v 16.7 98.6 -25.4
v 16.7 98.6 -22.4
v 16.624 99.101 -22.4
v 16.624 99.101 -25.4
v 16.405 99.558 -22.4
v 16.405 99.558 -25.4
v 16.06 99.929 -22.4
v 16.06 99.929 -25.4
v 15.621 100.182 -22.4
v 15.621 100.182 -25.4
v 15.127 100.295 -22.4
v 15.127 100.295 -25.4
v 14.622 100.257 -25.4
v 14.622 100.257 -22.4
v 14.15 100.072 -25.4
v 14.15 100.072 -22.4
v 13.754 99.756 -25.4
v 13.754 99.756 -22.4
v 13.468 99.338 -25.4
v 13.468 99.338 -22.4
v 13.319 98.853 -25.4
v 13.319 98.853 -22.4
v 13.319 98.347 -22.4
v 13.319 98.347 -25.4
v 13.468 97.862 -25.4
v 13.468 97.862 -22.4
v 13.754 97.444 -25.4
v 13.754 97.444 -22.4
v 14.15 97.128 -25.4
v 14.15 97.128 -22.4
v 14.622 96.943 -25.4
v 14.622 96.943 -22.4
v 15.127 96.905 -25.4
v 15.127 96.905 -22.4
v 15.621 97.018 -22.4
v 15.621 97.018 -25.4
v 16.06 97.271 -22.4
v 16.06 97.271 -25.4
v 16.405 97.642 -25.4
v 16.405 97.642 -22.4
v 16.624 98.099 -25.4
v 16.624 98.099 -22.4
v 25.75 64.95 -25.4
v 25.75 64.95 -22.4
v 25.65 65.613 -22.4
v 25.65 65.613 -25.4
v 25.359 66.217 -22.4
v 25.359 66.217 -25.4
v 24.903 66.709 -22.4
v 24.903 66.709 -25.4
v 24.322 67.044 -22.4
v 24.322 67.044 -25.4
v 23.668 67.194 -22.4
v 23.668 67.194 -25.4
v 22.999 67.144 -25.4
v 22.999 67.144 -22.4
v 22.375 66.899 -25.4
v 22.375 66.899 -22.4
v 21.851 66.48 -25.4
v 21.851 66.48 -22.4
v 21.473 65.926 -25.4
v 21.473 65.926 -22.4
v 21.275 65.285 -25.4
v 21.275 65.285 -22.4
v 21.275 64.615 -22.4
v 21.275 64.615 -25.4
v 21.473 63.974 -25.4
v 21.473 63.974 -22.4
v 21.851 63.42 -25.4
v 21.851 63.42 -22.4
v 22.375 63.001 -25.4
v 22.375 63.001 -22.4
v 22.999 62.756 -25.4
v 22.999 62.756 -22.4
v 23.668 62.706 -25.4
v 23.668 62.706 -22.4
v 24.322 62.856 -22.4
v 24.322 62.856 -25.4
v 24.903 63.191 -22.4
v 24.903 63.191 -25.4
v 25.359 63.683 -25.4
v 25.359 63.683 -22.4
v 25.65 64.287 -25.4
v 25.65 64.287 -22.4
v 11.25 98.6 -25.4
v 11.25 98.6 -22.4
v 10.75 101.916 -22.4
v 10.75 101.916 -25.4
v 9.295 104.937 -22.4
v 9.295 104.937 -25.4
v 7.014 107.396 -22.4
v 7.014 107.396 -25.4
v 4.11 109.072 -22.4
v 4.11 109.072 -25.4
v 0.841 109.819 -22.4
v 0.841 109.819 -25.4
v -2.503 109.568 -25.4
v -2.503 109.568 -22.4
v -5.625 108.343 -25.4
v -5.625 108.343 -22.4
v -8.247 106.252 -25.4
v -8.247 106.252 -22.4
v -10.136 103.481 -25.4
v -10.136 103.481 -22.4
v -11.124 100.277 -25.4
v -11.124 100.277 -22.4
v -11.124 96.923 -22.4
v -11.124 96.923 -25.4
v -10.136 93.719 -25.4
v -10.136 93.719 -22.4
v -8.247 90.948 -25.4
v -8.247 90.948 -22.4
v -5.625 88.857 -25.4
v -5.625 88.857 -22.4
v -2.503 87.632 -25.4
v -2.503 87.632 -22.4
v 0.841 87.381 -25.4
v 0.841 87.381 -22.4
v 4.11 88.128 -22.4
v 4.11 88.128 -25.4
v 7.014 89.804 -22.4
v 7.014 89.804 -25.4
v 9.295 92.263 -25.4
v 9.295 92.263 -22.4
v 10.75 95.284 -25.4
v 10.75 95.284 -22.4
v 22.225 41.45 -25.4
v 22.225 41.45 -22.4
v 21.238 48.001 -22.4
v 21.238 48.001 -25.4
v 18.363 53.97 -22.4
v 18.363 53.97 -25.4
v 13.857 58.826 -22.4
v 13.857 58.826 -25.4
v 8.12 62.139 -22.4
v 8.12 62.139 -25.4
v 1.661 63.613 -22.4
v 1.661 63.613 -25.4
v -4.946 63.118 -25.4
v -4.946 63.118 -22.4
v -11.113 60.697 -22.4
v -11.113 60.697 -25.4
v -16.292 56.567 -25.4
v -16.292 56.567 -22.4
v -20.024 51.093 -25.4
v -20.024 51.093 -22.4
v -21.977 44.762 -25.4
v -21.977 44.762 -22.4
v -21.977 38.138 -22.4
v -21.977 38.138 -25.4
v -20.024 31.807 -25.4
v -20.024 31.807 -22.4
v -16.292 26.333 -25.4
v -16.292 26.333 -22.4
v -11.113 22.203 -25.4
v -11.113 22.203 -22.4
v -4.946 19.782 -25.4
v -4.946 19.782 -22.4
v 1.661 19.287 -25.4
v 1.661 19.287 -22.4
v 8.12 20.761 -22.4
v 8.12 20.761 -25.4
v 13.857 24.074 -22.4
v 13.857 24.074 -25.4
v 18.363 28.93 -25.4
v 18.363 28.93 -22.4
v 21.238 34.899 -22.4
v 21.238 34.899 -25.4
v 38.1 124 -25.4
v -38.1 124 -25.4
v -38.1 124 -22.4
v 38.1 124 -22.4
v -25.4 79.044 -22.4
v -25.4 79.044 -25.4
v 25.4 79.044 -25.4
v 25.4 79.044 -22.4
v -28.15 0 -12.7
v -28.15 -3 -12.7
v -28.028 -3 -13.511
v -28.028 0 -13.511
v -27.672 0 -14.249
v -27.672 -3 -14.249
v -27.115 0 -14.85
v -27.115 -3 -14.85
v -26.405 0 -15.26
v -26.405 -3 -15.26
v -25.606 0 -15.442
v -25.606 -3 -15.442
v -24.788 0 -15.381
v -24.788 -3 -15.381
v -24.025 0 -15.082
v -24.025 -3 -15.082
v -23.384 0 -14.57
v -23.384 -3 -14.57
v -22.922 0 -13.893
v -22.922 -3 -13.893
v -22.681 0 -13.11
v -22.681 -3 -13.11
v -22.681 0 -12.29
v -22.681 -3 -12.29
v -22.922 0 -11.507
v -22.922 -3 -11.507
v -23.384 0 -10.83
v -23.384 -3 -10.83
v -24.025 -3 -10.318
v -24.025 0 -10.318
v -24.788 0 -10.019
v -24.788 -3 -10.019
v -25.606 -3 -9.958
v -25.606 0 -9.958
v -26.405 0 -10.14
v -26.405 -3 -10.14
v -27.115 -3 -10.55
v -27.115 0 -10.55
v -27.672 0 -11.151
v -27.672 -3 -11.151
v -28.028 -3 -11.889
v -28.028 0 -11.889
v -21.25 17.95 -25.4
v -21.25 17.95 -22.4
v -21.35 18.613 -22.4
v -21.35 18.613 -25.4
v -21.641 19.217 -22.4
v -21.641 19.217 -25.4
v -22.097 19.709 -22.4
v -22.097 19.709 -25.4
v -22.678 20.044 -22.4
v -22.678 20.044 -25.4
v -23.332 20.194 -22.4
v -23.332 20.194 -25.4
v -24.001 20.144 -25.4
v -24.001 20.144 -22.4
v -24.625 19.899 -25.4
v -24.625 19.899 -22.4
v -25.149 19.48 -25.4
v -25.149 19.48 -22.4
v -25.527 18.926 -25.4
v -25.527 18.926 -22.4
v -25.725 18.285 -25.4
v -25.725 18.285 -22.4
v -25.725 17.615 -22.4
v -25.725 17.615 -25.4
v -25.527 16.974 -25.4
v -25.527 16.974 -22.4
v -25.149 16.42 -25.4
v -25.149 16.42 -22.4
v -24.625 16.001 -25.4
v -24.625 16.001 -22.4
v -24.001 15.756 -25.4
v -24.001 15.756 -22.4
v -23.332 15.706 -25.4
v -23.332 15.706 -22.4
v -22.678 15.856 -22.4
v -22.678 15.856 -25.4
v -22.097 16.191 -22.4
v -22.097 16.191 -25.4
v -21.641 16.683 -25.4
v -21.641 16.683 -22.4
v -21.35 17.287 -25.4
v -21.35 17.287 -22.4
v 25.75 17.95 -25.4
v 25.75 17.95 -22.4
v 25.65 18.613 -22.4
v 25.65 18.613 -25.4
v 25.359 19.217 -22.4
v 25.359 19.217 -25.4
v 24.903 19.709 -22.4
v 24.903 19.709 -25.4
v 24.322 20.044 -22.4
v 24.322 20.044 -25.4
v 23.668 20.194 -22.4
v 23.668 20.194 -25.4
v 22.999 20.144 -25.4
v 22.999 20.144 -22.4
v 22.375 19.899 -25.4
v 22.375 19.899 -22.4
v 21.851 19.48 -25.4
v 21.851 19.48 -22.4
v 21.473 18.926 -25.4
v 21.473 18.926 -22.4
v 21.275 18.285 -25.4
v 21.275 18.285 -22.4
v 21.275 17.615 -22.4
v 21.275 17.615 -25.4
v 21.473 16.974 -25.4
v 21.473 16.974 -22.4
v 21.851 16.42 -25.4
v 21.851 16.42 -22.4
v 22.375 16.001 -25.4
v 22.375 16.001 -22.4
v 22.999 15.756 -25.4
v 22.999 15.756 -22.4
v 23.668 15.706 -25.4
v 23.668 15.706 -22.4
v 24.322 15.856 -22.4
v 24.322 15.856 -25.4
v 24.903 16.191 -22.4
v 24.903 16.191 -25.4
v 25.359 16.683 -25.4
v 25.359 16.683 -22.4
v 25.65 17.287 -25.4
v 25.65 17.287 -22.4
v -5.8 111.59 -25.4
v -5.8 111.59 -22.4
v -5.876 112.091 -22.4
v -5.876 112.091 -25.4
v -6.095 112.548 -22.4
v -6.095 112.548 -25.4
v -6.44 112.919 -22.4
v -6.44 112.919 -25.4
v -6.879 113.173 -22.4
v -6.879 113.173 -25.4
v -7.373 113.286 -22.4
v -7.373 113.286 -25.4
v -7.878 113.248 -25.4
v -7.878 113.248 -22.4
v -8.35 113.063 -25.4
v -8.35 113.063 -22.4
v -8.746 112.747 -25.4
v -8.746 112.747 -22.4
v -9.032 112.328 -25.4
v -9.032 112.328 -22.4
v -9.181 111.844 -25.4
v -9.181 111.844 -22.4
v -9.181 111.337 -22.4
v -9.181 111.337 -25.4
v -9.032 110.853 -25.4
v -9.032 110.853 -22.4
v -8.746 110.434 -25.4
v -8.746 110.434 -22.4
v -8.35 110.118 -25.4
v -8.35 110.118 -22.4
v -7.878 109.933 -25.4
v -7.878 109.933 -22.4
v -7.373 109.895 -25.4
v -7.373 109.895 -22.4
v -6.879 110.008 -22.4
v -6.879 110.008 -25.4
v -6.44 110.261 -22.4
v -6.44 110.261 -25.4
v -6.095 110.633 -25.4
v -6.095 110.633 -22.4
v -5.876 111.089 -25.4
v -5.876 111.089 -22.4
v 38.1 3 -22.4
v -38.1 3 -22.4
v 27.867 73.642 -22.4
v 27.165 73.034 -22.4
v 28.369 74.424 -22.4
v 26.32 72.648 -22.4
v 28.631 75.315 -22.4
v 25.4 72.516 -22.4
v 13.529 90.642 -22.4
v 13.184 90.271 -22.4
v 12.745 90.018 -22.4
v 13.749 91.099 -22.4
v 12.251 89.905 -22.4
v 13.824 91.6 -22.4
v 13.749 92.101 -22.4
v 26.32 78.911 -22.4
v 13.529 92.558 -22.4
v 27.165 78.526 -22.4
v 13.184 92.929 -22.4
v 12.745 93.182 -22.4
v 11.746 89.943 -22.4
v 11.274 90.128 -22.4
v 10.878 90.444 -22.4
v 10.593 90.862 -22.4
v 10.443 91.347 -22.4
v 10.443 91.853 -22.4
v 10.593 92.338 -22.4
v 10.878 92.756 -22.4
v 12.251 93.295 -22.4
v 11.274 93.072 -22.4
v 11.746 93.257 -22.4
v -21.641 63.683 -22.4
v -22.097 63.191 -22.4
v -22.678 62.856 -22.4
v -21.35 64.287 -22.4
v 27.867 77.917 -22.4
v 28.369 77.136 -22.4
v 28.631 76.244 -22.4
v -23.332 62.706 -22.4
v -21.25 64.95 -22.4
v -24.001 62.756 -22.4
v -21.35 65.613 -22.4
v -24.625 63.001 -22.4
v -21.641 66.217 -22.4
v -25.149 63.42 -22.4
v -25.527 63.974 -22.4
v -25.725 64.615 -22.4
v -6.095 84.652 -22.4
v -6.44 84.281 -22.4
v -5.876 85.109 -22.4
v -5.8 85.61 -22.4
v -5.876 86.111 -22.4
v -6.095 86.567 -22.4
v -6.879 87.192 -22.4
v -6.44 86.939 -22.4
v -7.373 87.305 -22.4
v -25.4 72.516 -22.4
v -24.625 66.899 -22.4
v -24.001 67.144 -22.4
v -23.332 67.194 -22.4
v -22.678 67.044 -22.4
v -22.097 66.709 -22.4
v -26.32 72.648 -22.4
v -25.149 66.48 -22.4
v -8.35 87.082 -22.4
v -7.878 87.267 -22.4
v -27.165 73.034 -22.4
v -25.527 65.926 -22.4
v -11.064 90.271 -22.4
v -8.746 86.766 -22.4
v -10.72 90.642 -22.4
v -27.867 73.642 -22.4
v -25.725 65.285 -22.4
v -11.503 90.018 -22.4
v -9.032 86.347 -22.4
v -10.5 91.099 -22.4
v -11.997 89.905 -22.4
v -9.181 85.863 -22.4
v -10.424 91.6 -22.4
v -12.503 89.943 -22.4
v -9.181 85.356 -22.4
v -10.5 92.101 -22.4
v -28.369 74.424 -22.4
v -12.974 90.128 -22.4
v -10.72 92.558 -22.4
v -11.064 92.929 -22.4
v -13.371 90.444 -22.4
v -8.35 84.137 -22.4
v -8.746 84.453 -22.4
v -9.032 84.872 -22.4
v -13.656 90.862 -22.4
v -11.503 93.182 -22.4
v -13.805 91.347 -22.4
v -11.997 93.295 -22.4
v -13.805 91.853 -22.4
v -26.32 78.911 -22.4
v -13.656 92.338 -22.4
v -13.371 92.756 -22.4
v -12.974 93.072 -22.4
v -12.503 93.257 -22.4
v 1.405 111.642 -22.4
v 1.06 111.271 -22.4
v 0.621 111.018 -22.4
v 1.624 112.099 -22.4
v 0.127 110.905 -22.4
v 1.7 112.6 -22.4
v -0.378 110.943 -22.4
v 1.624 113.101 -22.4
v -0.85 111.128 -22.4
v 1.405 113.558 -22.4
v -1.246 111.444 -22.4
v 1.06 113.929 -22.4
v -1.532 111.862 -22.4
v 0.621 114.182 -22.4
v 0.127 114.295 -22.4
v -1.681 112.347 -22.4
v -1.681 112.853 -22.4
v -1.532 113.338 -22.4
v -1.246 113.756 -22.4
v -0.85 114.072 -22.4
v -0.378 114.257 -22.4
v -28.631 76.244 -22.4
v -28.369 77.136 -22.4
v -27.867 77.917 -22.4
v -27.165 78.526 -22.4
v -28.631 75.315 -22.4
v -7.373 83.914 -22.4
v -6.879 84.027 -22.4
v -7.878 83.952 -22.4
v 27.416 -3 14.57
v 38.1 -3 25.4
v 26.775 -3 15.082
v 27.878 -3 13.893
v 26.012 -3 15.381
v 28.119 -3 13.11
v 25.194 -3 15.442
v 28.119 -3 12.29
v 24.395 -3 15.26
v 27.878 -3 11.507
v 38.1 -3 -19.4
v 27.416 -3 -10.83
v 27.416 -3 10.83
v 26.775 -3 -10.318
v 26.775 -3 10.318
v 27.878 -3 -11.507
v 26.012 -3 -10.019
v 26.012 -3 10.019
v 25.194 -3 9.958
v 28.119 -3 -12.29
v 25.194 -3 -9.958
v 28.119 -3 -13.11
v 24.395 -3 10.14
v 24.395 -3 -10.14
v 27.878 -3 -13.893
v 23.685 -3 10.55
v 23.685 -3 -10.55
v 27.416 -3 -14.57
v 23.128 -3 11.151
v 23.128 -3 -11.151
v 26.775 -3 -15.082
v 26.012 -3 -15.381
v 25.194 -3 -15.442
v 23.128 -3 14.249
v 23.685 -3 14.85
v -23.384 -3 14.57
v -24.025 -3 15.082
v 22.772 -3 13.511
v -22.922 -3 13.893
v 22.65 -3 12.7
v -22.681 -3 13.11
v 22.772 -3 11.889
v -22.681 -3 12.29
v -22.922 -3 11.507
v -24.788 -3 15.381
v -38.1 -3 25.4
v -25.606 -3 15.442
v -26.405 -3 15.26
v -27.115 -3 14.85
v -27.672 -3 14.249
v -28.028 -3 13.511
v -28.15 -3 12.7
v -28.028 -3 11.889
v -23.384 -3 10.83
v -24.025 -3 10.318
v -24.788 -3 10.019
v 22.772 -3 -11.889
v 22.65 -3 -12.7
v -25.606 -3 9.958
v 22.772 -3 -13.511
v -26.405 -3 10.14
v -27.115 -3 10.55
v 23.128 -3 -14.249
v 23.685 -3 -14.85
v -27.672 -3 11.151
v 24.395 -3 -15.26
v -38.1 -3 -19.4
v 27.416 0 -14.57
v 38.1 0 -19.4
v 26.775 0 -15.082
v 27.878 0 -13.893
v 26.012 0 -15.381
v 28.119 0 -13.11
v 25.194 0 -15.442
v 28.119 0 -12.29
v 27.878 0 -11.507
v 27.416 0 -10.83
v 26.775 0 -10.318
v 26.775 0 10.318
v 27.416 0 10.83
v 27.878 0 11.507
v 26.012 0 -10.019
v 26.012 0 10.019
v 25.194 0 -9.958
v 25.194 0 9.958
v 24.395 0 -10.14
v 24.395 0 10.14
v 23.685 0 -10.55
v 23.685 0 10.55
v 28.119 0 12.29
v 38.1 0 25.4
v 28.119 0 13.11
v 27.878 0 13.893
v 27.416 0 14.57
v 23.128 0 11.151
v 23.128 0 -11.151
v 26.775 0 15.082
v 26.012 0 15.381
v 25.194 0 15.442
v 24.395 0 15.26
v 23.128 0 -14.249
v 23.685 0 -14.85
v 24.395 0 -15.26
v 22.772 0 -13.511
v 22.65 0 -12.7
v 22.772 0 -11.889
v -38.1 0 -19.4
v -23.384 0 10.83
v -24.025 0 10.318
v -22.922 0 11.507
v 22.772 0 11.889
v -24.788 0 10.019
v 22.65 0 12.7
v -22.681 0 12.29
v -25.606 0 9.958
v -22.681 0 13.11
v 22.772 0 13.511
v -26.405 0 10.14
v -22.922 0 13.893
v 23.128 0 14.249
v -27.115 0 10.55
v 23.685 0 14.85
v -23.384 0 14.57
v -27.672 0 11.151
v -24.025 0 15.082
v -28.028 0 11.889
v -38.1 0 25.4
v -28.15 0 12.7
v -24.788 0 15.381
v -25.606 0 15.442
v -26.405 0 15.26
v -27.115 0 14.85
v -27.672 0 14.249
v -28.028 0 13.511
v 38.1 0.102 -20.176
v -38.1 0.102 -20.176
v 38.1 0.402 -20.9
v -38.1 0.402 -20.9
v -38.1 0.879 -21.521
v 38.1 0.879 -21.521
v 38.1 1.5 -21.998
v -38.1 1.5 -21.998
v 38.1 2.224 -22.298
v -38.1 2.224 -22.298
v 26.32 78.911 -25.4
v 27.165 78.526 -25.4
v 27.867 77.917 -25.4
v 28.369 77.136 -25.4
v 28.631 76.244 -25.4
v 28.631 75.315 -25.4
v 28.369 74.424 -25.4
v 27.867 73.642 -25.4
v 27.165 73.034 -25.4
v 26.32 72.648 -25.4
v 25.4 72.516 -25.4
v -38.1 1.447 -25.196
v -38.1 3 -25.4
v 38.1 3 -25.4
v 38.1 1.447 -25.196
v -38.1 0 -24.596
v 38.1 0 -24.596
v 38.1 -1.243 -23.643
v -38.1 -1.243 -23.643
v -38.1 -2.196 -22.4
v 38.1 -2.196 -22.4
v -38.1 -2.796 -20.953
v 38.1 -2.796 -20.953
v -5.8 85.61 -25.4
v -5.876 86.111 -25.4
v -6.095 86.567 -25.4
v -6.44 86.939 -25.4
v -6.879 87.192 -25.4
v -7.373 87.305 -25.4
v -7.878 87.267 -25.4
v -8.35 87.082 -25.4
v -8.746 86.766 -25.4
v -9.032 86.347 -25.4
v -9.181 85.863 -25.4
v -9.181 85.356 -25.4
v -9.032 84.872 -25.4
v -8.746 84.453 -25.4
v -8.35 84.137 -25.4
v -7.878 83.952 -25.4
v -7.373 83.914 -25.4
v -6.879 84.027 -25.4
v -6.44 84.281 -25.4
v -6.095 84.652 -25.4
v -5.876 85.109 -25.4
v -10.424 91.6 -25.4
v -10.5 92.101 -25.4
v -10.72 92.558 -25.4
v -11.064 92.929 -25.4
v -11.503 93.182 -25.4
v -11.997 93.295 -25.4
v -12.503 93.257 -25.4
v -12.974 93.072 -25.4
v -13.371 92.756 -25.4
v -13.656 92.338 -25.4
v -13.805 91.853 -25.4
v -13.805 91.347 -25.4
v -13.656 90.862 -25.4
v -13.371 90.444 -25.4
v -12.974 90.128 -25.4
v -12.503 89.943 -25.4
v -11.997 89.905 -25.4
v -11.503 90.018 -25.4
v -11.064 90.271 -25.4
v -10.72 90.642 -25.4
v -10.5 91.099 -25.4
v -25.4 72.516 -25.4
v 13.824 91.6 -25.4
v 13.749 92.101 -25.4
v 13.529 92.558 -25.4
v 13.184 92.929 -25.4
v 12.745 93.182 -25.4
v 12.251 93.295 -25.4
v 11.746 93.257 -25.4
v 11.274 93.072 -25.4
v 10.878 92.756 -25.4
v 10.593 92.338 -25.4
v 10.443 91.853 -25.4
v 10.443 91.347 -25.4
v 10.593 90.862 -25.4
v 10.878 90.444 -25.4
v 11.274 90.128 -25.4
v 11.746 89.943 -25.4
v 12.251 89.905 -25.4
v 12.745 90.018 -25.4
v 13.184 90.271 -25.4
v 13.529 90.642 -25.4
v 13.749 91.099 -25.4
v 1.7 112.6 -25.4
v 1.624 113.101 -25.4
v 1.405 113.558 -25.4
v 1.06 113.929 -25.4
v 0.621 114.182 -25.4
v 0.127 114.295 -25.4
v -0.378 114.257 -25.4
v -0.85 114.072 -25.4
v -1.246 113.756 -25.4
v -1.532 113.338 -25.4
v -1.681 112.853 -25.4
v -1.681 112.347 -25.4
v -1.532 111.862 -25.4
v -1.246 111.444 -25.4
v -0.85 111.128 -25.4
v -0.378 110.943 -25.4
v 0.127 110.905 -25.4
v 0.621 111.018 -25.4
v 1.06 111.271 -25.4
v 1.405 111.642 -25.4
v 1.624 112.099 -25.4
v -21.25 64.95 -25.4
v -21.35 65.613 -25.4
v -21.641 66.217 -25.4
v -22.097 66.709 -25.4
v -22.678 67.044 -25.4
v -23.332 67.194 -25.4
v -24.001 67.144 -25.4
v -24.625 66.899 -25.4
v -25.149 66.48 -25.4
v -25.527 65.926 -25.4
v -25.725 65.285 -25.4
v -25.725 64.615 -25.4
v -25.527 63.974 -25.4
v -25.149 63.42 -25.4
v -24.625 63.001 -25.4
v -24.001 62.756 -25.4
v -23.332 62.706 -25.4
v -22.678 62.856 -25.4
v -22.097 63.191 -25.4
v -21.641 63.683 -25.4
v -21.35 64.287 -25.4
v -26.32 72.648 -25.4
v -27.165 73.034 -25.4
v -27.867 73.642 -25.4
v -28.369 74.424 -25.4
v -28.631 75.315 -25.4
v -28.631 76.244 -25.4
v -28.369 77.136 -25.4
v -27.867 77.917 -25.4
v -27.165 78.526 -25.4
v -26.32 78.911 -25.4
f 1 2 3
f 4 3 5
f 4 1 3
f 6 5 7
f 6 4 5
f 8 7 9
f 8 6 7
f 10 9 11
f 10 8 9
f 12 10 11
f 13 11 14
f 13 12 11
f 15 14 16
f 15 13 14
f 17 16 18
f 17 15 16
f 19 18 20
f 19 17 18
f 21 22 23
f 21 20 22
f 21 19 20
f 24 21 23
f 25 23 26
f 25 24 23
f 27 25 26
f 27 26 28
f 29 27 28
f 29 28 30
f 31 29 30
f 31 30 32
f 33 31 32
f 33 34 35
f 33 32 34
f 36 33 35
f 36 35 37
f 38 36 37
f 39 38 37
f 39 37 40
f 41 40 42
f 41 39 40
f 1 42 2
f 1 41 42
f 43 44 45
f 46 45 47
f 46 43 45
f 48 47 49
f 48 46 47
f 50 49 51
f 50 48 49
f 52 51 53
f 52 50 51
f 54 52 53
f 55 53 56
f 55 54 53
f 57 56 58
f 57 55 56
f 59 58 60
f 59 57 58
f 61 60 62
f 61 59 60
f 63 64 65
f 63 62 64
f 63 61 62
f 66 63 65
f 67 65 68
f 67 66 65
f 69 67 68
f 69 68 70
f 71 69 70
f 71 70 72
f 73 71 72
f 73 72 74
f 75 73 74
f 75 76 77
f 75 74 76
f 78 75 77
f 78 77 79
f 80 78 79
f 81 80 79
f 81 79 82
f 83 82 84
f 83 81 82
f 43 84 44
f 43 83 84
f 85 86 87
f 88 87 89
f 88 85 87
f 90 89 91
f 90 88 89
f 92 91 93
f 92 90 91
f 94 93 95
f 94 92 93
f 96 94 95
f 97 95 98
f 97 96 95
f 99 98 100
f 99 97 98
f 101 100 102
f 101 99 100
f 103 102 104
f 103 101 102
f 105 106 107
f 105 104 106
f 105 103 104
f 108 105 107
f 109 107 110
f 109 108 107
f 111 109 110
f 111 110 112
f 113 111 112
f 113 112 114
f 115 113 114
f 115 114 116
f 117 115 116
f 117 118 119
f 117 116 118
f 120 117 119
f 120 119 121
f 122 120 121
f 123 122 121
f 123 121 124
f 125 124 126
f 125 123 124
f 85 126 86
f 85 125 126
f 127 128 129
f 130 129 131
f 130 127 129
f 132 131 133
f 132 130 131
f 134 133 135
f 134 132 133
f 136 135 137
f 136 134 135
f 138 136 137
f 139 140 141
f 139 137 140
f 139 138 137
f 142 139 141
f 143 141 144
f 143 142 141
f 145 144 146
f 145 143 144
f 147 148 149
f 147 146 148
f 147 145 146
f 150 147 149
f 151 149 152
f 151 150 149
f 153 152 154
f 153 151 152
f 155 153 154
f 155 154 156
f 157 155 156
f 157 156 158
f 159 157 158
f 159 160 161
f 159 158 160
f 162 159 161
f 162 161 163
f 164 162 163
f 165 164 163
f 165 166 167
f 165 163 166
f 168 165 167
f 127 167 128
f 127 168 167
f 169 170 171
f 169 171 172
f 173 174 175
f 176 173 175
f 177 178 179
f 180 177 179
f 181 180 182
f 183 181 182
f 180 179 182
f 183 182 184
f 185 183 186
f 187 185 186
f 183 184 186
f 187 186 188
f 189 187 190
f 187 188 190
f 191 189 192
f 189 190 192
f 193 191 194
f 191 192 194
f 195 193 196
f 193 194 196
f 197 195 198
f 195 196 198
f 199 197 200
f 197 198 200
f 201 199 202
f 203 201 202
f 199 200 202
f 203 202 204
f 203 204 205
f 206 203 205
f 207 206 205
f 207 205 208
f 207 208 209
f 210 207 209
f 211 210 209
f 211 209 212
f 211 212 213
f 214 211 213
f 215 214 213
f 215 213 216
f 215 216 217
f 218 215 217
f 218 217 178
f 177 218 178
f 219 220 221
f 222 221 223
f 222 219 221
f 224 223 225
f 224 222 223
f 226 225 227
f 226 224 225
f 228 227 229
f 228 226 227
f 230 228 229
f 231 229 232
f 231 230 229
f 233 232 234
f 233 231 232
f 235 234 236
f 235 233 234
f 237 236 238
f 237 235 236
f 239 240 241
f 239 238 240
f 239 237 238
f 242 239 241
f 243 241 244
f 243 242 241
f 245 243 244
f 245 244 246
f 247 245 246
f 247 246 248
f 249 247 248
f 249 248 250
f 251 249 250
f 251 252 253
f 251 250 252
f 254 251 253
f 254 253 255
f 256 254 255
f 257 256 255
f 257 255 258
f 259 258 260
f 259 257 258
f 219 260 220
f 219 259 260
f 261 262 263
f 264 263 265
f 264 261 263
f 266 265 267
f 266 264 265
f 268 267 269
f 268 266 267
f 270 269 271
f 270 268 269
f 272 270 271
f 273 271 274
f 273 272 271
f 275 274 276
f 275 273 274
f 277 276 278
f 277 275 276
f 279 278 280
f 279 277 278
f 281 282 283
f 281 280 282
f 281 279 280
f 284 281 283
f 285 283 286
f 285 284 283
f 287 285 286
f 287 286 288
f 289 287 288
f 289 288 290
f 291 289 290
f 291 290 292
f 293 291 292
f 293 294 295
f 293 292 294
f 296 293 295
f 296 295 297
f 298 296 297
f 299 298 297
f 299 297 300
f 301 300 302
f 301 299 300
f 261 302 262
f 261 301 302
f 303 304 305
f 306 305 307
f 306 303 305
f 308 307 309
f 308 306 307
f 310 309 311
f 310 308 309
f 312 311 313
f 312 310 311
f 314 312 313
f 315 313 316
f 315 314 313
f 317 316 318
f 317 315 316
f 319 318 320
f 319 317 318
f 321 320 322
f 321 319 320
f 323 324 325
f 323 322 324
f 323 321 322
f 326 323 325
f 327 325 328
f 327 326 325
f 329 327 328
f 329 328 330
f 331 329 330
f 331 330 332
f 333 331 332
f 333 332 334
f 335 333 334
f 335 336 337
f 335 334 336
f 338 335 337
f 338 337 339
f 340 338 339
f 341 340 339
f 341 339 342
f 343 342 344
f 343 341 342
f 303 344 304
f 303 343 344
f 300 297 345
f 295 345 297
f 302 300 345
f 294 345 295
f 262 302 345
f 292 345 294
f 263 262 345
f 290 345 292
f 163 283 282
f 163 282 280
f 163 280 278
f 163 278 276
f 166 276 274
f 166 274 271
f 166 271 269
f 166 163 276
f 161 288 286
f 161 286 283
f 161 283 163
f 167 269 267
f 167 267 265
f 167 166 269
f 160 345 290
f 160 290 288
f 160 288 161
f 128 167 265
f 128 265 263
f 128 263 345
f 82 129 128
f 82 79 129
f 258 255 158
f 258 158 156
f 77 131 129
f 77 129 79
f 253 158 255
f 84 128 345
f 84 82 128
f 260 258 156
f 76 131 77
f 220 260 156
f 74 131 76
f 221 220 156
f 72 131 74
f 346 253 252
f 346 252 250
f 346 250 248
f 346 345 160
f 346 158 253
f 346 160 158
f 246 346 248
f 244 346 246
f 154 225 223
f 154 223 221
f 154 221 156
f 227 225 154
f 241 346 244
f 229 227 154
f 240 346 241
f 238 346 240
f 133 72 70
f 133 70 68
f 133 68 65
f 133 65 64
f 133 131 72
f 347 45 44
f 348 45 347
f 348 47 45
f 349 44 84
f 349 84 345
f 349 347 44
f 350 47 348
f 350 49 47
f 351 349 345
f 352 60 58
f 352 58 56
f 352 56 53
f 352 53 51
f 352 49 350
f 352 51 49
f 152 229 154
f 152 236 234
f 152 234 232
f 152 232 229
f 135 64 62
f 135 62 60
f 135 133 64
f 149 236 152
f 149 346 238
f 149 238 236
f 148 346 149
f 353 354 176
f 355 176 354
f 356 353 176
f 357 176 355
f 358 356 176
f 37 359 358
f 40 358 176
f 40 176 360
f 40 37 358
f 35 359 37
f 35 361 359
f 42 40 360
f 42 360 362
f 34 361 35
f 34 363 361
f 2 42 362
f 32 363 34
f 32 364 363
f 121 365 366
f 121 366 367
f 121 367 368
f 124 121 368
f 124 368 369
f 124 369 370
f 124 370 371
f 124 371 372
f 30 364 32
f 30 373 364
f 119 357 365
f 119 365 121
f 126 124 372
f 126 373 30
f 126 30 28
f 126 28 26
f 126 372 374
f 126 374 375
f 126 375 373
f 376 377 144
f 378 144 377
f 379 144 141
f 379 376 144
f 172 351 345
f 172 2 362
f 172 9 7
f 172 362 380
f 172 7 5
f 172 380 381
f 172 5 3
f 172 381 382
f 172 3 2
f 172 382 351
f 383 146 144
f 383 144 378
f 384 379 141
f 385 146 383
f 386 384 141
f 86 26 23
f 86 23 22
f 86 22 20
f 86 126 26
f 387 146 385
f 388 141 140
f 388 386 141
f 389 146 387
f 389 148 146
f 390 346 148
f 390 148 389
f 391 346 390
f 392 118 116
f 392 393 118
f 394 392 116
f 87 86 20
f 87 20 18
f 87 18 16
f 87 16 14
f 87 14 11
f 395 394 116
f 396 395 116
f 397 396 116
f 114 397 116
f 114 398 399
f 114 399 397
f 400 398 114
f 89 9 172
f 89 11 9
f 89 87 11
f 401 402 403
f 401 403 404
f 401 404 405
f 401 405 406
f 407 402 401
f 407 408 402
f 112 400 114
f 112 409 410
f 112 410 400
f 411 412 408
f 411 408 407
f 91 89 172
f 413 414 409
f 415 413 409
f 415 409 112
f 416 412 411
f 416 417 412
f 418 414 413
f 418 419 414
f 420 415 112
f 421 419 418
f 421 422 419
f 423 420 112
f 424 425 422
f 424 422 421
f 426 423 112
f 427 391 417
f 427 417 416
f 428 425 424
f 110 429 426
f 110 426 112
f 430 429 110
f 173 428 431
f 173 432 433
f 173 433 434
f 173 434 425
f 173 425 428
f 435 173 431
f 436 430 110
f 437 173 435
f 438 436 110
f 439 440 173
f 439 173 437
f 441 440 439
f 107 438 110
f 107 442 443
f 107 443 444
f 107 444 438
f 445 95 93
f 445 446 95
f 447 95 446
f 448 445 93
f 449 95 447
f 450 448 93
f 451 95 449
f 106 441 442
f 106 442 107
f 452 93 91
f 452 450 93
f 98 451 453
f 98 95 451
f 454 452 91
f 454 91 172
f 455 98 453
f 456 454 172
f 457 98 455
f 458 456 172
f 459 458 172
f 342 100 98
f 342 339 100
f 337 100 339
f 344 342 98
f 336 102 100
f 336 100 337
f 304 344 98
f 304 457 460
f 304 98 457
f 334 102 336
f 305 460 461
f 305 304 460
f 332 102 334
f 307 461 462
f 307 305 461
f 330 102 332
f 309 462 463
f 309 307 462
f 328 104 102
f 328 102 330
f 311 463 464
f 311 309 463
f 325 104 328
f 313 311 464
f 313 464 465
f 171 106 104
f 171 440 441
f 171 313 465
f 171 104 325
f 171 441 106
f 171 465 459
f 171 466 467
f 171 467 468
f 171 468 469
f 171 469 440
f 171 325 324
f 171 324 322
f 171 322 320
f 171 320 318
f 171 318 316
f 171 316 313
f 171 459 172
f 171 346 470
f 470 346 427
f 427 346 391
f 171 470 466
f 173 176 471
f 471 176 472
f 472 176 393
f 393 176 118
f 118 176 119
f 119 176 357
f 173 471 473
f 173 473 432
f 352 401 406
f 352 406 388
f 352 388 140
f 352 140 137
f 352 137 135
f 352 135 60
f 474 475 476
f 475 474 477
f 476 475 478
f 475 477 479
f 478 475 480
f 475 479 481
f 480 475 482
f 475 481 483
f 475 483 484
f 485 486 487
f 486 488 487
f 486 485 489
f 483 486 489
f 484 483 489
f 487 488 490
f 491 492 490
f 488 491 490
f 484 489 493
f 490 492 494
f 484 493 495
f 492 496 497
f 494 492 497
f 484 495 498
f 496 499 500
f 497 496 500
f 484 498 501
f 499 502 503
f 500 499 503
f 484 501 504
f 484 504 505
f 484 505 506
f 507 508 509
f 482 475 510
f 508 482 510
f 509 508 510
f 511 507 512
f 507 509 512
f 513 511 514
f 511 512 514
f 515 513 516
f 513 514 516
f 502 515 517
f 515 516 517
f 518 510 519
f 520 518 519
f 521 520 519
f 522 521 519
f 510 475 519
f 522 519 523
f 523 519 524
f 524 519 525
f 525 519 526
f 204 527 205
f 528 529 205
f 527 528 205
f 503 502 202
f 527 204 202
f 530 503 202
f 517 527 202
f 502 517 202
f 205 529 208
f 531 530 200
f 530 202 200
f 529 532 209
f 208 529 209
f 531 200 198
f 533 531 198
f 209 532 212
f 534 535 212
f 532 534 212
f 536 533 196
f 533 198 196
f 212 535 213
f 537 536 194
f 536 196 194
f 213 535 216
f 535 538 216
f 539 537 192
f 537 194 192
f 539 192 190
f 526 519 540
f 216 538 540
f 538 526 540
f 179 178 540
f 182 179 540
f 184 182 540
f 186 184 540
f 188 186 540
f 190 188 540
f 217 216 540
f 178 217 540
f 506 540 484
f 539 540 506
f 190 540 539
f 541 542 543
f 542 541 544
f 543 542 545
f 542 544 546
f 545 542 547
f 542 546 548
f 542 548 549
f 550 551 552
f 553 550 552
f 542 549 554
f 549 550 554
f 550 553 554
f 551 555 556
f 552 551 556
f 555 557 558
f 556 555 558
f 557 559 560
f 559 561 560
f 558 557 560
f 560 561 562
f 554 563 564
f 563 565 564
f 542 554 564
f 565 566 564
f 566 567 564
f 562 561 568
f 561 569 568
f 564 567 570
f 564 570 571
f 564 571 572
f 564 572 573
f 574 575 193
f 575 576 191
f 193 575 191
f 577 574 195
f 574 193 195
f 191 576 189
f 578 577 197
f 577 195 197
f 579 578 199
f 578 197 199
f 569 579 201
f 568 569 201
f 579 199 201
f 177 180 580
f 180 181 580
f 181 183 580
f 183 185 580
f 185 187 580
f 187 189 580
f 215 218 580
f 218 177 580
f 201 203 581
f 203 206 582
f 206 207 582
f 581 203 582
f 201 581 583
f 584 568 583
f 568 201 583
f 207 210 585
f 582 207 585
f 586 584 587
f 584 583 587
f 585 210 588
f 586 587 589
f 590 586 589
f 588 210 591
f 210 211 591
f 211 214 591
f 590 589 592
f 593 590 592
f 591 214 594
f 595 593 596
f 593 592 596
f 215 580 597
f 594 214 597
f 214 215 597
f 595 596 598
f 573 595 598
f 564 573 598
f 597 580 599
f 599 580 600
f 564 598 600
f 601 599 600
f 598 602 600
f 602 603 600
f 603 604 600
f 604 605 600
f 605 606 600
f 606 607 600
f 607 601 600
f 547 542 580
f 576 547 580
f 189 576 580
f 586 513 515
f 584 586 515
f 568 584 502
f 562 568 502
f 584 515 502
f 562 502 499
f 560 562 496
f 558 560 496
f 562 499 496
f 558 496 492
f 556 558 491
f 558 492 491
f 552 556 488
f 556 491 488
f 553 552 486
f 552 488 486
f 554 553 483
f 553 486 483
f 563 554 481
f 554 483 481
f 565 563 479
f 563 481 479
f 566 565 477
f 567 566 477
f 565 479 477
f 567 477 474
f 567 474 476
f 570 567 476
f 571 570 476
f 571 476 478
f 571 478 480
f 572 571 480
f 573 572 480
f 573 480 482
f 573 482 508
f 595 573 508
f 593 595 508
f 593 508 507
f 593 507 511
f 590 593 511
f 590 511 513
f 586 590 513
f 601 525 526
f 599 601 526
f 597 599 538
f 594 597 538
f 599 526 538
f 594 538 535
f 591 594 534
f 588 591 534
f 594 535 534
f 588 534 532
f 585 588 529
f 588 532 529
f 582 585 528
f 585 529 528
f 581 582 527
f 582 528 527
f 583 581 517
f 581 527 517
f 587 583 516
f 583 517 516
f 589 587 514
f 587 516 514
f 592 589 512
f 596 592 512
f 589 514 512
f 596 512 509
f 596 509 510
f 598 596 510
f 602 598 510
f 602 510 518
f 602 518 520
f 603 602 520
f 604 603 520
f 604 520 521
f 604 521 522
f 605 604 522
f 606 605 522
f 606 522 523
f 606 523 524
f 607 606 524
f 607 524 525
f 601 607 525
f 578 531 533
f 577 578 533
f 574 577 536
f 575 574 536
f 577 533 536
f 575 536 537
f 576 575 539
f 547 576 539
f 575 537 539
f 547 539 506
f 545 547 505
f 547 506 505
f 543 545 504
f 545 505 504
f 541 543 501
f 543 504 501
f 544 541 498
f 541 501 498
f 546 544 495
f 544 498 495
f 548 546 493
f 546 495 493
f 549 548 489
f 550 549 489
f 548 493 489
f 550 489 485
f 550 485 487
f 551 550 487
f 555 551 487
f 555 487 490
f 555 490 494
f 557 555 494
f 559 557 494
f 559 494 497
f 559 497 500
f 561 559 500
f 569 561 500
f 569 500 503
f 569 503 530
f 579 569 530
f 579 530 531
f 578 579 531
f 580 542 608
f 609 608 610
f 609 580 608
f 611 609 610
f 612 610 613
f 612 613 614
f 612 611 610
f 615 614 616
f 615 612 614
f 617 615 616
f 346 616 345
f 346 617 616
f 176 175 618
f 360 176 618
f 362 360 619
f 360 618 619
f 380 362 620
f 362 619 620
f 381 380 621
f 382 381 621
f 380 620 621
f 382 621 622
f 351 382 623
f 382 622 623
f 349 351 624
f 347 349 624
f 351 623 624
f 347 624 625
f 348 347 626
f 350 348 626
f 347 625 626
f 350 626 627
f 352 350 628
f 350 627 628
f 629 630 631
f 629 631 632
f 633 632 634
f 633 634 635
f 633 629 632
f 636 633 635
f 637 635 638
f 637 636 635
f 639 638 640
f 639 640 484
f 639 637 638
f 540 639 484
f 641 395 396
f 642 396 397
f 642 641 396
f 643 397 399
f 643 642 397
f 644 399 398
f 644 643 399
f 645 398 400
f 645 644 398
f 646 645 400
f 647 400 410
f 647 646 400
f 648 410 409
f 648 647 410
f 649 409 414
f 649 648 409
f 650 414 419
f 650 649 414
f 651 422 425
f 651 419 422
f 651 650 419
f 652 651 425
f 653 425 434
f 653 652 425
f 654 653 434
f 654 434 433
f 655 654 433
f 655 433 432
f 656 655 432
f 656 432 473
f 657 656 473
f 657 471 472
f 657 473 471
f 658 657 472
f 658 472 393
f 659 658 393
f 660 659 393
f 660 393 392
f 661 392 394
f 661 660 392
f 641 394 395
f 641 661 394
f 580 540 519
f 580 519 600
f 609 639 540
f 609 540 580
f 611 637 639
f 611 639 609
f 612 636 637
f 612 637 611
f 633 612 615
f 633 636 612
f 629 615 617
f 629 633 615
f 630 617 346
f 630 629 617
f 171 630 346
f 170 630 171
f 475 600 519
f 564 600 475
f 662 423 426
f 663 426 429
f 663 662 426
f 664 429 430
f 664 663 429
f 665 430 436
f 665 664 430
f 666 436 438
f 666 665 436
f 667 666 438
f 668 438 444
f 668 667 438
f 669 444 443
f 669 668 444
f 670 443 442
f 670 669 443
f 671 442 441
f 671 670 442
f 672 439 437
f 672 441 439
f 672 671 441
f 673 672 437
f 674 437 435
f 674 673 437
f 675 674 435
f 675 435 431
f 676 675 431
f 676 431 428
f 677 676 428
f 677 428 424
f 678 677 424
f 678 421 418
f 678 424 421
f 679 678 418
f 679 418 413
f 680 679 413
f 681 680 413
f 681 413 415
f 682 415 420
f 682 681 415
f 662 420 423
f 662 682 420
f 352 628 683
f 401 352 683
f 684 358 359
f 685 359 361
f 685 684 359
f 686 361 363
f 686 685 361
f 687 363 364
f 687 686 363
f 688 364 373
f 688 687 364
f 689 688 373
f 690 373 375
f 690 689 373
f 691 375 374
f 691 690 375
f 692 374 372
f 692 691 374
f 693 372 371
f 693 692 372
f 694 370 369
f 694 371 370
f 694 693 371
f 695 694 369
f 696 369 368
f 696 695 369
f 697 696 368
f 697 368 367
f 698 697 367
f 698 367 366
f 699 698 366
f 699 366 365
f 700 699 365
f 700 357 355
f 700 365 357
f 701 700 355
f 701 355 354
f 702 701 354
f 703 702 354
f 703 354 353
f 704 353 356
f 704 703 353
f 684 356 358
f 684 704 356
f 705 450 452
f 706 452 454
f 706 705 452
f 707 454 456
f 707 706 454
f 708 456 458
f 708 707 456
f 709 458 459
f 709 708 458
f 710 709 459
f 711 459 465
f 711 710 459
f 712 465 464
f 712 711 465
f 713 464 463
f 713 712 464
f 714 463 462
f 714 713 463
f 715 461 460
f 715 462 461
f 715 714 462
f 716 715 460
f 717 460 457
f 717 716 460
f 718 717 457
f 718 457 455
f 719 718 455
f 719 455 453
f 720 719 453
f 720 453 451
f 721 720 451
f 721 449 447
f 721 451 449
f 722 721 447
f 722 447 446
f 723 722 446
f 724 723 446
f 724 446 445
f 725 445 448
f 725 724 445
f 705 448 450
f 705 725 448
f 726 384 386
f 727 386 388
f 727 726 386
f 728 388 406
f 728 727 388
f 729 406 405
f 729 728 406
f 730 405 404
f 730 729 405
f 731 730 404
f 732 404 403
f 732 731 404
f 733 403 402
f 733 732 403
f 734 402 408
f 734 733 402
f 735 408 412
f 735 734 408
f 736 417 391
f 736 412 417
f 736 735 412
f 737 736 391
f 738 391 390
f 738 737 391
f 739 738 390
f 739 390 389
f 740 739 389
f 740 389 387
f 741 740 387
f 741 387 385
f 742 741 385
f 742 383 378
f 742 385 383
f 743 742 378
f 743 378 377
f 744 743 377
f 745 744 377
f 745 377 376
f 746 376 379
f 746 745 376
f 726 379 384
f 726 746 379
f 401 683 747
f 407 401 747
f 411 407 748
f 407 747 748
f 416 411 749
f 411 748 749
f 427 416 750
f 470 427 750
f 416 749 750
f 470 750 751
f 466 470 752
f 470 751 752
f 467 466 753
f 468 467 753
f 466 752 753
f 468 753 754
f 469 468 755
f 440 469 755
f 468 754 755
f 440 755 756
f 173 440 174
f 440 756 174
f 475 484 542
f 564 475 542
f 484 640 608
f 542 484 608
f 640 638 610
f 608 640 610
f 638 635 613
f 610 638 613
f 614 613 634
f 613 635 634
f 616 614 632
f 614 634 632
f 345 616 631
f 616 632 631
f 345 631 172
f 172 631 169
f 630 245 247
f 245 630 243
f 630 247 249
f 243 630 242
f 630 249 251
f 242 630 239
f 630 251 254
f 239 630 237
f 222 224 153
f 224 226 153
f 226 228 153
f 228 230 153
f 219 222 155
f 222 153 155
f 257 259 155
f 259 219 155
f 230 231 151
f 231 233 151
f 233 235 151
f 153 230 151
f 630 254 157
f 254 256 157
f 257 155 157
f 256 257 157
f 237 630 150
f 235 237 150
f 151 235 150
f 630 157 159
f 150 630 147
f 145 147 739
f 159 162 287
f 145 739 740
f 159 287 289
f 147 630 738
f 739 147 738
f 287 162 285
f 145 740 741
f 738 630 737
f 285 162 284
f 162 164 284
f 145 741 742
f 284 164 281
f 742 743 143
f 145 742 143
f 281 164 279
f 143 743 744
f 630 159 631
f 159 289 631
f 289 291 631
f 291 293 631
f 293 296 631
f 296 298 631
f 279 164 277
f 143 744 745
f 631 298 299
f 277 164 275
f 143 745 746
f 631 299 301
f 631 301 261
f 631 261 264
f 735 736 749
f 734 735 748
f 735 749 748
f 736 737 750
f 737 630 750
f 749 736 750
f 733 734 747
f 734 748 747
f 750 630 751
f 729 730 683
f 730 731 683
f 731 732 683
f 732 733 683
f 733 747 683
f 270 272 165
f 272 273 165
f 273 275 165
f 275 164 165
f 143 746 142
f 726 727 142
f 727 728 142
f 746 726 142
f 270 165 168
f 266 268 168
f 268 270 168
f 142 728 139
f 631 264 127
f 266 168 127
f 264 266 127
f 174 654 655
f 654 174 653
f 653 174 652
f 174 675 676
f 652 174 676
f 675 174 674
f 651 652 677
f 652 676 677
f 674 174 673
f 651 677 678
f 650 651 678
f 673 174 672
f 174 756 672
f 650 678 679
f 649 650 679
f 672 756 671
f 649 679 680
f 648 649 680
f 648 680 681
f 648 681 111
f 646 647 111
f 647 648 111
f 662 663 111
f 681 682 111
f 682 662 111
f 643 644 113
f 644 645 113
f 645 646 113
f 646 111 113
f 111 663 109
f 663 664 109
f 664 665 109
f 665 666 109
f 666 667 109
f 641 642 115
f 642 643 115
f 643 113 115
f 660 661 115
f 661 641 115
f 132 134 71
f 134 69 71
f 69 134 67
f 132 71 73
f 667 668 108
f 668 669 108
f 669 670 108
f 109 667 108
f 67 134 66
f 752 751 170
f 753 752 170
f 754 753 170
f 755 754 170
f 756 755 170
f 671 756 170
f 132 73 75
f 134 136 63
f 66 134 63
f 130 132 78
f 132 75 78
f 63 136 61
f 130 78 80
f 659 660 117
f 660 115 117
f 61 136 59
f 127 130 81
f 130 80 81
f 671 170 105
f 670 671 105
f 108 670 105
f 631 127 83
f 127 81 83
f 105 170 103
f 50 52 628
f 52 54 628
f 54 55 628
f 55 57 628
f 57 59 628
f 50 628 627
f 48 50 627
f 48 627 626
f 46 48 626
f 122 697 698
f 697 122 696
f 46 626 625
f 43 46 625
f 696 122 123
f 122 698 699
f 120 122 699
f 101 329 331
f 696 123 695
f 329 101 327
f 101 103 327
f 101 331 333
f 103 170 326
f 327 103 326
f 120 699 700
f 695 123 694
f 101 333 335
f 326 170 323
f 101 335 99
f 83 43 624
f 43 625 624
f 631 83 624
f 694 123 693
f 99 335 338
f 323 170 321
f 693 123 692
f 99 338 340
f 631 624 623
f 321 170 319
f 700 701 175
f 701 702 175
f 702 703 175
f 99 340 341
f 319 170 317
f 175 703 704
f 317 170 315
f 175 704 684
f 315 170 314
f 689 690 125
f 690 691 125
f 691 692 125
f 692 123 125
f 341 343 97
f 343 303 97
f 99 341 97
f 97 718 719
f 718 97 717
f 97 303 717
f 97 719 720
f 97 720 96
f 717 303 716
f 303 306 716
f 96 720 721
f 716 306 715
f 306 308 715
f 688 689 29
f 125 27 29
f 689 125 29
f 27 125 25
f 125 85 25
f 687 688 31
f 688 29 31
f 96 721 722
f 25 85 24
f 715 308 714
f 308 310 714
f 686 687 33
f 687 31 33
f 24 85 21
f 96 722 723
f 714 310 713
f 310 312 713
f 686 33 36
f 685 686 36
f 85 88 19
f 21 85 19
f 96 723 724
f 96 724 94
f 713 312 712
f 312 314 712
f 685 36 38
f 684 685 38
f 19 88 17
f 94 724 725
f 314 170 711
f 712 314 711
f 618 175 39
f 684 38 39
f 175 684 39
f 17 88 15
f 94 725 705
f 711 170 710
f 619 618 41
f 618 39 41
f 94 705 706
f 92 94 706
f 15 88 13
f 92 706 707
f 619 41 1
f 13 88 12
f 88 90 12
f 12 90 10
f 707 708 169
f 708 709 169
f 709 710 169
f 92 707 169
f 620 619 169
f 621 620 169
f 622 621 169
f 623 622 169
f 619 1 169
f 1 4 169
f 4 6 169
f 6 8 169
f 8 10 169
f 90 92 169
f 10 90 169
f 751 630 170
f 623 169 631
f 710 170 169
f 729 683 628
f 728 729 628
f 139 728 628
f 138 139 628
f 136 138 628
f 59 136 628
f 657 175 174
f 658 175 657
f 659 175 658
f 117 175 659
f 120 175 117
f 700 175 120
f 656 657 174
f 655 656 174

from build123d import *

# Parameters (mm, degrees)
SKETCH1_W                    = 76.2
SKETCH1_H                    = 50.8
BASE_FLANGE1_DEPTH           = 3
EDGE_FLANGE1_STRIP_W         = 18
EDGE_FLANGE1_STRIP_H         = 3
EDGE_FLANGE1_STRIP_CUT_DEPTH = 76.2
EDGE_FLANGE1_DEPTH           = 76.2
UNFOLD1_START                = -38.1
UNFOLD1_DEPTH                = 76.2
UNFOLD1_2_DEPTH              = 76.2
M5_CLEARANCE_HOLE1_D         = 5.5
M4_CLEARANCE_HOLE1_D         = 4.5
SKETCH15_R                   = 22.225
CUT_EXTRUDE1_DEPTH           = 153.340385686
M3_CLEARANCE_HOLE1_D         = 3.4
CIRPATTERN1_COUNT            = 3
SKETCH19_R                   = 11.25
CUT_EXTRUDE2_DEPTH           = 153.340385686
FOLD1_START                  = -147.468583471
FOLD1_OUTLINE_W              = 76.2
FOLD1_OUTLINE_H              = 3
FOLD1_DEPTH                  = 122.685023471
FOLD1_START_2                = -22.41644
FOLD1_2_OUTLINE_W            = 76.2
FOLD1_2_OUTLINE_H            = 124
FOLD1_2_OUTLINE_R            = 2.25
FOLD1_2_OUTLINE_R_2          = 22.225
FOLD1_2_OUTLINE_R_3          = 1.7
FOLD1_2_OUTLINE_R_4          = 11.25
FOLD1_2_DEPTH                = 0.01644
FOLD1_START_3                = -25.4
FOLD1_3_OUTLINE_W            = 76.2
FOLD1_3_OUTLINE_H            = 124
FOLD1_3_OUTLINE_R            = 2.25
FOLD1_3_OUTLINE_R_2          = 22.225
FOLD1_3_OUTLINE_R_3          = 1.7
FOLD1_3_OUTLINE_R_4          = 11.25
FOLD1_3_DEPTH                = 6
FOLD1_START_4                = -38.1
FOLD1_4_DEPTH                = 76.2


with BuildPart() as part:
    # Base-Flange1: sheet metal written as solids
    # Sketch1 → Base-Flange1 (new body)
    with BuildSketch(Plane(origin=(0, 0, 0), x_dir=(1, 0, 0), z_dir=(0, 1, 0))):
        Rectangle(SKETCH1_W, SKETCH1_H)
    extrude(amount=-BASE_FLANGE1_DEPTH)

    # Edge-Flange1: sheet metal written as solids
    # Edge-Flange1 strip (on a plane across the edge) → Edge-Flange1 strip cut (cut)
    with BuildSketch(Plane(origin=(38.1, 0, -25.4), x_dir=(0, 0, 1), z_dir=(-1, 0, 0))):
        with Locations((-3, -1.5)):
            Rectangle(EDGE_FLANGE1_STRIP_W, EDGE_FLANGE1_STRIP_H)
    extrude(amount=EDGE_FLANGE1_STRIP_CUT_DEPTH, mode=Mode.SUBTRACT)

    # Edge-Flange1 section (on a plane across the edge) → Edge-Flange1 (add)
    with BuildSketch(Plane(origin=(38.1, 0, -25.4), x_dir=(0, 0, 1), z_dir=(-1, 0, 0))):
        with BuildLine():
            Line((0, 3), (0, 124))
            Line((0, 124), (3, 124))
            Line((3, 124), (3, 3))
            ThreePointArc((3, 3), (3.878679656, 0.878679656), (6, 0))
            Line((6, 0), (6, -3))
            ThreePointArc((6, -3), (1.757359313, -1.242640687), (0, 3))
        make_face()
    extrude(amount=EDGE_FLANGE1_DEPTH)

    # Unfold1: read off the stored shape, not the designer's step
    # Unfold1 outline → Unfold1 (cut)
    with BuildSketch(Plane.YZ.offset(UNFOLD1_START)):
        with BuildLine():
            Line((0, -19.4), (0, -24.596152423))
            ThreePointArc((0, -24.596152423), (1.447085729, -25.195554958), (3, -25.4))
            Line((3, -25.4), (124, -25.4))
            Line((124, -25.4), (124, -22.4))
            Line((124, -22.4), (3, -22.4))
            ThreePointArc((3, -22.4), (0.878679656, -21.521320344), (0, -19.4))
        make_face()
    extrude(amount=UNFOLD1_DEPTH, mode=Mode.SUBTRACT)

    # Unfold1 2 outline → Unfold1 2 (add)
    with BuildSketch(Plane.YZ.offset(UNFOLD1_START)):
        with BuildLine():
            Line((-3, -19.4), (-3, -147.468583471))
            Line((-3, -147.468583471), (0, -147.468583471))
            Line((0, -147.468583471), (0, -24.596152423))
            ThreePointArc((0, -24.596152423), (-2.196152423, -22.4), (-3, -19.4))
        make_face()
    extrude(amount=UNFOLD1_2_DEPTH)

    # M5 Clearance Hole1 (through all)
    with Locations(Plane(origin=(0, 0, 0), x_dir=(1, 0, 0), z_dir=(0, 1, 0))):
        with Locations((-25.4, 12.7), (-25.4, -12.7), (25.4, -12.7), (25.4, 12.7)):
            Hole(M5_CLEARANCE_HOLE1_D / 2)

    # M4 Clearance Hole1 (through all)
    with Locations(Plane(origin=(0, 0, 0), x_dir=(1, 0, 0), z_dir=(0, 1, 0))):
        with Locations((-23.5, 41.418583471), (23.5, 88.418583471), (-23.5, 88.418583471), (23.5, 41.418583471)):
            Hole(M4_CLEARANCE_HOLE1_D / 2)

    # Sketch15 → Cut-Extrude1 (cut, through all)
    with BuildSketch(Plane(origin=(0, 0, 0), x_dir=(1, 0, 0), z_dir=(0, 1, 0))):
        with Locations(Location((0, 64.918583471, 0), (0, 0, 270))):
            Circle(SKETCH15_R)
    extrude(amount=-CUT_EXTRUDE1_DEPTH, mode=Mode.SUBTRACT)

    # M3 Clearance Hole1 (through all)
    with Locations(Plane(origin=(0, 0, 0), x_dir=(1, 0, 0), z_dir=(0, 1, 0))):
        with Locations((0, 136.068583471), (-7.5, 135.058964527)):
            m3_clearance_hole1 = Hole(M3_CLEARANCE_HOLE1_D / 2)

    # CirPattern1: M3 Clearance Hole1 ×3 about axis
    cirpattern1_axis = Axis((0, 0, -122.068583471), (0, 1, 0))
    for i in range(1, CIRPATTERN1_COUNT):
        add(m3_clearance_hole1.rotate(cirpattern1_axis, i * 360 / CIRPATTERN1_COUNT), mode=Mode.SUBTRACT)

    # Sketch19 → Cut-Extrude2 (cut, through all)
    with BuildSketch(Plane(origin=(0, 0, 0), x_dir=(1, 0, 0), z_dir=(0, 1, 0))):
        with Locations(Location((0, 122.068583471, 0), (0, 0, 270))):
            Circle(SKETCH19_R)
        with BuildLine():
            Line((-25.4, 102.512292942), (25.4, 102.512292942))
            ThreePointArc((25.4, 102.512292942), (28.6639, 99.248392942), (25.4, 95.984492942))
            Line((25.4, 95.984492942), (-25.4, 95.984492942))
            ThreePointArc((-25.4, 95.984492942), (-28.6639, 99.248392942), (-25.4, 102.512292942))
        make_face()
    extrude(amount=-CUT_EXTRUDE2_DEPTH, mode=Mode.SUBTRACT)

    # Fold1: read off the stored shape, not the designer's step
    # Fold1 outline → Fold1 (cut)
    with BuildSketch(Plane.XY.offset(FOLD1_START)):
        with Locations((0, -1.5)):
            Rectangle(FOLD1_OUTLINE_W, FOLD1_OUTLINE_H)
    extrude(amount=FOLD1_DEPTH, mode=Mode.SUBTRACT)

    # Fold1 2 outline → Fold1 2 (add)
    with BuildSketch(Plane.XY.offset(FOLD1_START_2)):
        with Locations((0, 62)):
            Rectangle(FOLD1_2_OUTLINE_W, FOLD1_2_OUTLINE_H)
        with Locations((-23.5, 17.95)):
            Circle(FOLD1_2_OUTLINE_R, mode=Mode.SUBTRACT)
        with Locations((23.5, 17.95)):
            Circle(FOLD1_2_OUTLINE_R, mode=Mode.SUBTRACT)
        with Locations((0, 41.45)):
            Circle(FOLD1_2_OUTLINE_R_2, mode=Mode.SUBTRACT)
        with Locations((-23.5, 64.95)):
            Circle(FOLD1_2_OUTLINE_R, mode=Mode.SUBTRACT)
        with Locations((-12.124355653, 91.6)):
            Circle(FOLD1_2_OUTLINE_R_3, mode=Mode.SUBTRACT)
        with Locations((-7.5, 85.609618943)):
            Circle(FOLD1_2_OUTLINE_R_3, mode=Mode.SUBTRACT)
        with Locations((-7.5, 111.590381057)):
            Circle(FOLD1_2_OUTLINE_R_3, mode=Mode.SUBTRACT)
        with BuildLine():
            ThreePointArc((-25.4, 72.515909472), (-28.6639, 75.779809472), (-25.4, 79.043709472))
            Line((-25.4, 79.043709472), (25.4, 79.043709472))
            ThreePointArc((25.4, 79.043709472), (28.6639, 75.779809472), (25.4, 72.515909472))
            Line((25.4, 72.515909472), (-25.4, 72.515909472))
        make_face(mode=Mode.SUBTRACT)
        with Locations((12.124355653, 91.6)):
            Circle(FOLD1_2_OUTLINE_R_3, mode=Mode.SUBTRACT)
        with Locations((23.5, 64.95)):
            Circle(FOLD1_2_OUTLINE_R, mode=Mode.SUBTRACT)
        with Locations((0, 98.6)):
            Circle(FOLD1_2_OUTLINE_R_4, mode=Mode.SUBTRACT)
        with Locations((15, 98.6)):
            Circle(FOLD1_2_OUTLINE_R_3, mode=Mode.SUBTRACT)
        with Locations((0, 112.6)):
            Circle(FOLD1_2_OUTLINE_R_3, mode=Mode.SUBTRACT)
    extrude(amount=FOLD1_2_DEPTH)

    # Fold1 3 outline → Fold1 3 (add)
    with BuildSketch(Plane.XY.offset(FOLD1_START_3)):
        with Locations((0, 62)):
            Rectangle(FOLD1_3_OUTLINE_W, FOLD1_3_OUTLINE_H)
        with Locations((-23.5, 17.95)):
            Circle(FOLD1_3_OUTLINE_R, mode=Mode.SUBTRACT)
        with Locations((23.5, 17.95)):
            Circle(FOLD1_3_OUTLINE_R, mode=Mode.SUBTRACT)
        with Locations((0, 41.45)):
            Circle(FOLD1_3_OUTLINE_R_2, mode=Mode.SUBTRACT)
        with Locations((-23.5, 64.95)):
            Circle(FOLD1_3_OUTLINE_R, mode=Mode.SUBTRACT)
        with Locations((-12.124355653, 91.6)):
            Circle(FOLD1_3_OUTLINE_R_3, mode=Mode.SUBTRACT)
        with Locations((-7.5, 85.609618943)):
            Circle(FOLD1_3_OUTLINE_R_3, mode=Mode.SUBTRACT)
        with Locations((-7.5, 111.590381057)):
            Circle(FOLD1_3_OUTLINE_R_3, mode=Mode.SUBTRACT)
        with BuildLine():
            ThreePointArc((-25.4, 72.515909472), (-28.6639, 75.779809472), (-25.4, 79.043709472))
            Line((-25.4, 79.043709472), (25.4, 79.043709472))
            ThreePointArc((25.4, 79.043709472), (28.6639, 75.779809472), (25.4, 72.515909472))
            Line((25.4, 72.515909472), (-25.4, 72.515909472))
        make_face(mode=Mode.SUBTRACT)
        with Locations((12.124355653, 91.6)):
            Circle(FOLD1_3_OUTLINE_R_3, mode=Mode.SUBTRACT)
        with Locations((23.5, 64.95)):
            Circle(FOLD1_3_OUTLINE_R, mode=Mode.SUBTRACT)
        with Locations((0, 98.6)):
            Circle(FOLD1_3_OUTLINE_R_4, mode=Mode.SUBTRACT)
        with Locations((15, 98.6)):
            Circle(FOLD1_3_OUTLINE_R_3, mode=Mode.SUBTRACT)
        with Locations((0, 112.6)):
            Circle(FOLD1_3_OUTLINE_R_3, mode=Mode.SUBTRACT)
    extrude(amount=FOLD1_3_DEPTH)

    # Fold1 4 outline → Fold1 4 (cut)
    with BuildSketch(Plane.YZ.offset(FOLD1_START_4)):
        with BuildLine():
            Line((124, -22.4), (124, -19.4))
            Line((124, -19.4), (0, -19.4))
            ThreePointArc((0, -19.4), (0.878679656, -21.521320344), (3, -22.4))
            Line((3, -22.4), (124, -22.4))
        make_face()
        with BuildLine():
            Line((0, -25.4), (3, -25.4))
            ThreePointArc((3, -25.4), (-1.242640687, -23.642640687), (-3, -19.4))
            Line((-3, -19.4), (-3, -24.78356))
            Line((-3, -24.78356), (0, -24.78356))
            Line((0, -24.78356), (0, -25.4))
        make_face()
    extrude(amount=FOLD1_4_DEPTH, mode=Mode.SUBTRACT)


solid = part.part
